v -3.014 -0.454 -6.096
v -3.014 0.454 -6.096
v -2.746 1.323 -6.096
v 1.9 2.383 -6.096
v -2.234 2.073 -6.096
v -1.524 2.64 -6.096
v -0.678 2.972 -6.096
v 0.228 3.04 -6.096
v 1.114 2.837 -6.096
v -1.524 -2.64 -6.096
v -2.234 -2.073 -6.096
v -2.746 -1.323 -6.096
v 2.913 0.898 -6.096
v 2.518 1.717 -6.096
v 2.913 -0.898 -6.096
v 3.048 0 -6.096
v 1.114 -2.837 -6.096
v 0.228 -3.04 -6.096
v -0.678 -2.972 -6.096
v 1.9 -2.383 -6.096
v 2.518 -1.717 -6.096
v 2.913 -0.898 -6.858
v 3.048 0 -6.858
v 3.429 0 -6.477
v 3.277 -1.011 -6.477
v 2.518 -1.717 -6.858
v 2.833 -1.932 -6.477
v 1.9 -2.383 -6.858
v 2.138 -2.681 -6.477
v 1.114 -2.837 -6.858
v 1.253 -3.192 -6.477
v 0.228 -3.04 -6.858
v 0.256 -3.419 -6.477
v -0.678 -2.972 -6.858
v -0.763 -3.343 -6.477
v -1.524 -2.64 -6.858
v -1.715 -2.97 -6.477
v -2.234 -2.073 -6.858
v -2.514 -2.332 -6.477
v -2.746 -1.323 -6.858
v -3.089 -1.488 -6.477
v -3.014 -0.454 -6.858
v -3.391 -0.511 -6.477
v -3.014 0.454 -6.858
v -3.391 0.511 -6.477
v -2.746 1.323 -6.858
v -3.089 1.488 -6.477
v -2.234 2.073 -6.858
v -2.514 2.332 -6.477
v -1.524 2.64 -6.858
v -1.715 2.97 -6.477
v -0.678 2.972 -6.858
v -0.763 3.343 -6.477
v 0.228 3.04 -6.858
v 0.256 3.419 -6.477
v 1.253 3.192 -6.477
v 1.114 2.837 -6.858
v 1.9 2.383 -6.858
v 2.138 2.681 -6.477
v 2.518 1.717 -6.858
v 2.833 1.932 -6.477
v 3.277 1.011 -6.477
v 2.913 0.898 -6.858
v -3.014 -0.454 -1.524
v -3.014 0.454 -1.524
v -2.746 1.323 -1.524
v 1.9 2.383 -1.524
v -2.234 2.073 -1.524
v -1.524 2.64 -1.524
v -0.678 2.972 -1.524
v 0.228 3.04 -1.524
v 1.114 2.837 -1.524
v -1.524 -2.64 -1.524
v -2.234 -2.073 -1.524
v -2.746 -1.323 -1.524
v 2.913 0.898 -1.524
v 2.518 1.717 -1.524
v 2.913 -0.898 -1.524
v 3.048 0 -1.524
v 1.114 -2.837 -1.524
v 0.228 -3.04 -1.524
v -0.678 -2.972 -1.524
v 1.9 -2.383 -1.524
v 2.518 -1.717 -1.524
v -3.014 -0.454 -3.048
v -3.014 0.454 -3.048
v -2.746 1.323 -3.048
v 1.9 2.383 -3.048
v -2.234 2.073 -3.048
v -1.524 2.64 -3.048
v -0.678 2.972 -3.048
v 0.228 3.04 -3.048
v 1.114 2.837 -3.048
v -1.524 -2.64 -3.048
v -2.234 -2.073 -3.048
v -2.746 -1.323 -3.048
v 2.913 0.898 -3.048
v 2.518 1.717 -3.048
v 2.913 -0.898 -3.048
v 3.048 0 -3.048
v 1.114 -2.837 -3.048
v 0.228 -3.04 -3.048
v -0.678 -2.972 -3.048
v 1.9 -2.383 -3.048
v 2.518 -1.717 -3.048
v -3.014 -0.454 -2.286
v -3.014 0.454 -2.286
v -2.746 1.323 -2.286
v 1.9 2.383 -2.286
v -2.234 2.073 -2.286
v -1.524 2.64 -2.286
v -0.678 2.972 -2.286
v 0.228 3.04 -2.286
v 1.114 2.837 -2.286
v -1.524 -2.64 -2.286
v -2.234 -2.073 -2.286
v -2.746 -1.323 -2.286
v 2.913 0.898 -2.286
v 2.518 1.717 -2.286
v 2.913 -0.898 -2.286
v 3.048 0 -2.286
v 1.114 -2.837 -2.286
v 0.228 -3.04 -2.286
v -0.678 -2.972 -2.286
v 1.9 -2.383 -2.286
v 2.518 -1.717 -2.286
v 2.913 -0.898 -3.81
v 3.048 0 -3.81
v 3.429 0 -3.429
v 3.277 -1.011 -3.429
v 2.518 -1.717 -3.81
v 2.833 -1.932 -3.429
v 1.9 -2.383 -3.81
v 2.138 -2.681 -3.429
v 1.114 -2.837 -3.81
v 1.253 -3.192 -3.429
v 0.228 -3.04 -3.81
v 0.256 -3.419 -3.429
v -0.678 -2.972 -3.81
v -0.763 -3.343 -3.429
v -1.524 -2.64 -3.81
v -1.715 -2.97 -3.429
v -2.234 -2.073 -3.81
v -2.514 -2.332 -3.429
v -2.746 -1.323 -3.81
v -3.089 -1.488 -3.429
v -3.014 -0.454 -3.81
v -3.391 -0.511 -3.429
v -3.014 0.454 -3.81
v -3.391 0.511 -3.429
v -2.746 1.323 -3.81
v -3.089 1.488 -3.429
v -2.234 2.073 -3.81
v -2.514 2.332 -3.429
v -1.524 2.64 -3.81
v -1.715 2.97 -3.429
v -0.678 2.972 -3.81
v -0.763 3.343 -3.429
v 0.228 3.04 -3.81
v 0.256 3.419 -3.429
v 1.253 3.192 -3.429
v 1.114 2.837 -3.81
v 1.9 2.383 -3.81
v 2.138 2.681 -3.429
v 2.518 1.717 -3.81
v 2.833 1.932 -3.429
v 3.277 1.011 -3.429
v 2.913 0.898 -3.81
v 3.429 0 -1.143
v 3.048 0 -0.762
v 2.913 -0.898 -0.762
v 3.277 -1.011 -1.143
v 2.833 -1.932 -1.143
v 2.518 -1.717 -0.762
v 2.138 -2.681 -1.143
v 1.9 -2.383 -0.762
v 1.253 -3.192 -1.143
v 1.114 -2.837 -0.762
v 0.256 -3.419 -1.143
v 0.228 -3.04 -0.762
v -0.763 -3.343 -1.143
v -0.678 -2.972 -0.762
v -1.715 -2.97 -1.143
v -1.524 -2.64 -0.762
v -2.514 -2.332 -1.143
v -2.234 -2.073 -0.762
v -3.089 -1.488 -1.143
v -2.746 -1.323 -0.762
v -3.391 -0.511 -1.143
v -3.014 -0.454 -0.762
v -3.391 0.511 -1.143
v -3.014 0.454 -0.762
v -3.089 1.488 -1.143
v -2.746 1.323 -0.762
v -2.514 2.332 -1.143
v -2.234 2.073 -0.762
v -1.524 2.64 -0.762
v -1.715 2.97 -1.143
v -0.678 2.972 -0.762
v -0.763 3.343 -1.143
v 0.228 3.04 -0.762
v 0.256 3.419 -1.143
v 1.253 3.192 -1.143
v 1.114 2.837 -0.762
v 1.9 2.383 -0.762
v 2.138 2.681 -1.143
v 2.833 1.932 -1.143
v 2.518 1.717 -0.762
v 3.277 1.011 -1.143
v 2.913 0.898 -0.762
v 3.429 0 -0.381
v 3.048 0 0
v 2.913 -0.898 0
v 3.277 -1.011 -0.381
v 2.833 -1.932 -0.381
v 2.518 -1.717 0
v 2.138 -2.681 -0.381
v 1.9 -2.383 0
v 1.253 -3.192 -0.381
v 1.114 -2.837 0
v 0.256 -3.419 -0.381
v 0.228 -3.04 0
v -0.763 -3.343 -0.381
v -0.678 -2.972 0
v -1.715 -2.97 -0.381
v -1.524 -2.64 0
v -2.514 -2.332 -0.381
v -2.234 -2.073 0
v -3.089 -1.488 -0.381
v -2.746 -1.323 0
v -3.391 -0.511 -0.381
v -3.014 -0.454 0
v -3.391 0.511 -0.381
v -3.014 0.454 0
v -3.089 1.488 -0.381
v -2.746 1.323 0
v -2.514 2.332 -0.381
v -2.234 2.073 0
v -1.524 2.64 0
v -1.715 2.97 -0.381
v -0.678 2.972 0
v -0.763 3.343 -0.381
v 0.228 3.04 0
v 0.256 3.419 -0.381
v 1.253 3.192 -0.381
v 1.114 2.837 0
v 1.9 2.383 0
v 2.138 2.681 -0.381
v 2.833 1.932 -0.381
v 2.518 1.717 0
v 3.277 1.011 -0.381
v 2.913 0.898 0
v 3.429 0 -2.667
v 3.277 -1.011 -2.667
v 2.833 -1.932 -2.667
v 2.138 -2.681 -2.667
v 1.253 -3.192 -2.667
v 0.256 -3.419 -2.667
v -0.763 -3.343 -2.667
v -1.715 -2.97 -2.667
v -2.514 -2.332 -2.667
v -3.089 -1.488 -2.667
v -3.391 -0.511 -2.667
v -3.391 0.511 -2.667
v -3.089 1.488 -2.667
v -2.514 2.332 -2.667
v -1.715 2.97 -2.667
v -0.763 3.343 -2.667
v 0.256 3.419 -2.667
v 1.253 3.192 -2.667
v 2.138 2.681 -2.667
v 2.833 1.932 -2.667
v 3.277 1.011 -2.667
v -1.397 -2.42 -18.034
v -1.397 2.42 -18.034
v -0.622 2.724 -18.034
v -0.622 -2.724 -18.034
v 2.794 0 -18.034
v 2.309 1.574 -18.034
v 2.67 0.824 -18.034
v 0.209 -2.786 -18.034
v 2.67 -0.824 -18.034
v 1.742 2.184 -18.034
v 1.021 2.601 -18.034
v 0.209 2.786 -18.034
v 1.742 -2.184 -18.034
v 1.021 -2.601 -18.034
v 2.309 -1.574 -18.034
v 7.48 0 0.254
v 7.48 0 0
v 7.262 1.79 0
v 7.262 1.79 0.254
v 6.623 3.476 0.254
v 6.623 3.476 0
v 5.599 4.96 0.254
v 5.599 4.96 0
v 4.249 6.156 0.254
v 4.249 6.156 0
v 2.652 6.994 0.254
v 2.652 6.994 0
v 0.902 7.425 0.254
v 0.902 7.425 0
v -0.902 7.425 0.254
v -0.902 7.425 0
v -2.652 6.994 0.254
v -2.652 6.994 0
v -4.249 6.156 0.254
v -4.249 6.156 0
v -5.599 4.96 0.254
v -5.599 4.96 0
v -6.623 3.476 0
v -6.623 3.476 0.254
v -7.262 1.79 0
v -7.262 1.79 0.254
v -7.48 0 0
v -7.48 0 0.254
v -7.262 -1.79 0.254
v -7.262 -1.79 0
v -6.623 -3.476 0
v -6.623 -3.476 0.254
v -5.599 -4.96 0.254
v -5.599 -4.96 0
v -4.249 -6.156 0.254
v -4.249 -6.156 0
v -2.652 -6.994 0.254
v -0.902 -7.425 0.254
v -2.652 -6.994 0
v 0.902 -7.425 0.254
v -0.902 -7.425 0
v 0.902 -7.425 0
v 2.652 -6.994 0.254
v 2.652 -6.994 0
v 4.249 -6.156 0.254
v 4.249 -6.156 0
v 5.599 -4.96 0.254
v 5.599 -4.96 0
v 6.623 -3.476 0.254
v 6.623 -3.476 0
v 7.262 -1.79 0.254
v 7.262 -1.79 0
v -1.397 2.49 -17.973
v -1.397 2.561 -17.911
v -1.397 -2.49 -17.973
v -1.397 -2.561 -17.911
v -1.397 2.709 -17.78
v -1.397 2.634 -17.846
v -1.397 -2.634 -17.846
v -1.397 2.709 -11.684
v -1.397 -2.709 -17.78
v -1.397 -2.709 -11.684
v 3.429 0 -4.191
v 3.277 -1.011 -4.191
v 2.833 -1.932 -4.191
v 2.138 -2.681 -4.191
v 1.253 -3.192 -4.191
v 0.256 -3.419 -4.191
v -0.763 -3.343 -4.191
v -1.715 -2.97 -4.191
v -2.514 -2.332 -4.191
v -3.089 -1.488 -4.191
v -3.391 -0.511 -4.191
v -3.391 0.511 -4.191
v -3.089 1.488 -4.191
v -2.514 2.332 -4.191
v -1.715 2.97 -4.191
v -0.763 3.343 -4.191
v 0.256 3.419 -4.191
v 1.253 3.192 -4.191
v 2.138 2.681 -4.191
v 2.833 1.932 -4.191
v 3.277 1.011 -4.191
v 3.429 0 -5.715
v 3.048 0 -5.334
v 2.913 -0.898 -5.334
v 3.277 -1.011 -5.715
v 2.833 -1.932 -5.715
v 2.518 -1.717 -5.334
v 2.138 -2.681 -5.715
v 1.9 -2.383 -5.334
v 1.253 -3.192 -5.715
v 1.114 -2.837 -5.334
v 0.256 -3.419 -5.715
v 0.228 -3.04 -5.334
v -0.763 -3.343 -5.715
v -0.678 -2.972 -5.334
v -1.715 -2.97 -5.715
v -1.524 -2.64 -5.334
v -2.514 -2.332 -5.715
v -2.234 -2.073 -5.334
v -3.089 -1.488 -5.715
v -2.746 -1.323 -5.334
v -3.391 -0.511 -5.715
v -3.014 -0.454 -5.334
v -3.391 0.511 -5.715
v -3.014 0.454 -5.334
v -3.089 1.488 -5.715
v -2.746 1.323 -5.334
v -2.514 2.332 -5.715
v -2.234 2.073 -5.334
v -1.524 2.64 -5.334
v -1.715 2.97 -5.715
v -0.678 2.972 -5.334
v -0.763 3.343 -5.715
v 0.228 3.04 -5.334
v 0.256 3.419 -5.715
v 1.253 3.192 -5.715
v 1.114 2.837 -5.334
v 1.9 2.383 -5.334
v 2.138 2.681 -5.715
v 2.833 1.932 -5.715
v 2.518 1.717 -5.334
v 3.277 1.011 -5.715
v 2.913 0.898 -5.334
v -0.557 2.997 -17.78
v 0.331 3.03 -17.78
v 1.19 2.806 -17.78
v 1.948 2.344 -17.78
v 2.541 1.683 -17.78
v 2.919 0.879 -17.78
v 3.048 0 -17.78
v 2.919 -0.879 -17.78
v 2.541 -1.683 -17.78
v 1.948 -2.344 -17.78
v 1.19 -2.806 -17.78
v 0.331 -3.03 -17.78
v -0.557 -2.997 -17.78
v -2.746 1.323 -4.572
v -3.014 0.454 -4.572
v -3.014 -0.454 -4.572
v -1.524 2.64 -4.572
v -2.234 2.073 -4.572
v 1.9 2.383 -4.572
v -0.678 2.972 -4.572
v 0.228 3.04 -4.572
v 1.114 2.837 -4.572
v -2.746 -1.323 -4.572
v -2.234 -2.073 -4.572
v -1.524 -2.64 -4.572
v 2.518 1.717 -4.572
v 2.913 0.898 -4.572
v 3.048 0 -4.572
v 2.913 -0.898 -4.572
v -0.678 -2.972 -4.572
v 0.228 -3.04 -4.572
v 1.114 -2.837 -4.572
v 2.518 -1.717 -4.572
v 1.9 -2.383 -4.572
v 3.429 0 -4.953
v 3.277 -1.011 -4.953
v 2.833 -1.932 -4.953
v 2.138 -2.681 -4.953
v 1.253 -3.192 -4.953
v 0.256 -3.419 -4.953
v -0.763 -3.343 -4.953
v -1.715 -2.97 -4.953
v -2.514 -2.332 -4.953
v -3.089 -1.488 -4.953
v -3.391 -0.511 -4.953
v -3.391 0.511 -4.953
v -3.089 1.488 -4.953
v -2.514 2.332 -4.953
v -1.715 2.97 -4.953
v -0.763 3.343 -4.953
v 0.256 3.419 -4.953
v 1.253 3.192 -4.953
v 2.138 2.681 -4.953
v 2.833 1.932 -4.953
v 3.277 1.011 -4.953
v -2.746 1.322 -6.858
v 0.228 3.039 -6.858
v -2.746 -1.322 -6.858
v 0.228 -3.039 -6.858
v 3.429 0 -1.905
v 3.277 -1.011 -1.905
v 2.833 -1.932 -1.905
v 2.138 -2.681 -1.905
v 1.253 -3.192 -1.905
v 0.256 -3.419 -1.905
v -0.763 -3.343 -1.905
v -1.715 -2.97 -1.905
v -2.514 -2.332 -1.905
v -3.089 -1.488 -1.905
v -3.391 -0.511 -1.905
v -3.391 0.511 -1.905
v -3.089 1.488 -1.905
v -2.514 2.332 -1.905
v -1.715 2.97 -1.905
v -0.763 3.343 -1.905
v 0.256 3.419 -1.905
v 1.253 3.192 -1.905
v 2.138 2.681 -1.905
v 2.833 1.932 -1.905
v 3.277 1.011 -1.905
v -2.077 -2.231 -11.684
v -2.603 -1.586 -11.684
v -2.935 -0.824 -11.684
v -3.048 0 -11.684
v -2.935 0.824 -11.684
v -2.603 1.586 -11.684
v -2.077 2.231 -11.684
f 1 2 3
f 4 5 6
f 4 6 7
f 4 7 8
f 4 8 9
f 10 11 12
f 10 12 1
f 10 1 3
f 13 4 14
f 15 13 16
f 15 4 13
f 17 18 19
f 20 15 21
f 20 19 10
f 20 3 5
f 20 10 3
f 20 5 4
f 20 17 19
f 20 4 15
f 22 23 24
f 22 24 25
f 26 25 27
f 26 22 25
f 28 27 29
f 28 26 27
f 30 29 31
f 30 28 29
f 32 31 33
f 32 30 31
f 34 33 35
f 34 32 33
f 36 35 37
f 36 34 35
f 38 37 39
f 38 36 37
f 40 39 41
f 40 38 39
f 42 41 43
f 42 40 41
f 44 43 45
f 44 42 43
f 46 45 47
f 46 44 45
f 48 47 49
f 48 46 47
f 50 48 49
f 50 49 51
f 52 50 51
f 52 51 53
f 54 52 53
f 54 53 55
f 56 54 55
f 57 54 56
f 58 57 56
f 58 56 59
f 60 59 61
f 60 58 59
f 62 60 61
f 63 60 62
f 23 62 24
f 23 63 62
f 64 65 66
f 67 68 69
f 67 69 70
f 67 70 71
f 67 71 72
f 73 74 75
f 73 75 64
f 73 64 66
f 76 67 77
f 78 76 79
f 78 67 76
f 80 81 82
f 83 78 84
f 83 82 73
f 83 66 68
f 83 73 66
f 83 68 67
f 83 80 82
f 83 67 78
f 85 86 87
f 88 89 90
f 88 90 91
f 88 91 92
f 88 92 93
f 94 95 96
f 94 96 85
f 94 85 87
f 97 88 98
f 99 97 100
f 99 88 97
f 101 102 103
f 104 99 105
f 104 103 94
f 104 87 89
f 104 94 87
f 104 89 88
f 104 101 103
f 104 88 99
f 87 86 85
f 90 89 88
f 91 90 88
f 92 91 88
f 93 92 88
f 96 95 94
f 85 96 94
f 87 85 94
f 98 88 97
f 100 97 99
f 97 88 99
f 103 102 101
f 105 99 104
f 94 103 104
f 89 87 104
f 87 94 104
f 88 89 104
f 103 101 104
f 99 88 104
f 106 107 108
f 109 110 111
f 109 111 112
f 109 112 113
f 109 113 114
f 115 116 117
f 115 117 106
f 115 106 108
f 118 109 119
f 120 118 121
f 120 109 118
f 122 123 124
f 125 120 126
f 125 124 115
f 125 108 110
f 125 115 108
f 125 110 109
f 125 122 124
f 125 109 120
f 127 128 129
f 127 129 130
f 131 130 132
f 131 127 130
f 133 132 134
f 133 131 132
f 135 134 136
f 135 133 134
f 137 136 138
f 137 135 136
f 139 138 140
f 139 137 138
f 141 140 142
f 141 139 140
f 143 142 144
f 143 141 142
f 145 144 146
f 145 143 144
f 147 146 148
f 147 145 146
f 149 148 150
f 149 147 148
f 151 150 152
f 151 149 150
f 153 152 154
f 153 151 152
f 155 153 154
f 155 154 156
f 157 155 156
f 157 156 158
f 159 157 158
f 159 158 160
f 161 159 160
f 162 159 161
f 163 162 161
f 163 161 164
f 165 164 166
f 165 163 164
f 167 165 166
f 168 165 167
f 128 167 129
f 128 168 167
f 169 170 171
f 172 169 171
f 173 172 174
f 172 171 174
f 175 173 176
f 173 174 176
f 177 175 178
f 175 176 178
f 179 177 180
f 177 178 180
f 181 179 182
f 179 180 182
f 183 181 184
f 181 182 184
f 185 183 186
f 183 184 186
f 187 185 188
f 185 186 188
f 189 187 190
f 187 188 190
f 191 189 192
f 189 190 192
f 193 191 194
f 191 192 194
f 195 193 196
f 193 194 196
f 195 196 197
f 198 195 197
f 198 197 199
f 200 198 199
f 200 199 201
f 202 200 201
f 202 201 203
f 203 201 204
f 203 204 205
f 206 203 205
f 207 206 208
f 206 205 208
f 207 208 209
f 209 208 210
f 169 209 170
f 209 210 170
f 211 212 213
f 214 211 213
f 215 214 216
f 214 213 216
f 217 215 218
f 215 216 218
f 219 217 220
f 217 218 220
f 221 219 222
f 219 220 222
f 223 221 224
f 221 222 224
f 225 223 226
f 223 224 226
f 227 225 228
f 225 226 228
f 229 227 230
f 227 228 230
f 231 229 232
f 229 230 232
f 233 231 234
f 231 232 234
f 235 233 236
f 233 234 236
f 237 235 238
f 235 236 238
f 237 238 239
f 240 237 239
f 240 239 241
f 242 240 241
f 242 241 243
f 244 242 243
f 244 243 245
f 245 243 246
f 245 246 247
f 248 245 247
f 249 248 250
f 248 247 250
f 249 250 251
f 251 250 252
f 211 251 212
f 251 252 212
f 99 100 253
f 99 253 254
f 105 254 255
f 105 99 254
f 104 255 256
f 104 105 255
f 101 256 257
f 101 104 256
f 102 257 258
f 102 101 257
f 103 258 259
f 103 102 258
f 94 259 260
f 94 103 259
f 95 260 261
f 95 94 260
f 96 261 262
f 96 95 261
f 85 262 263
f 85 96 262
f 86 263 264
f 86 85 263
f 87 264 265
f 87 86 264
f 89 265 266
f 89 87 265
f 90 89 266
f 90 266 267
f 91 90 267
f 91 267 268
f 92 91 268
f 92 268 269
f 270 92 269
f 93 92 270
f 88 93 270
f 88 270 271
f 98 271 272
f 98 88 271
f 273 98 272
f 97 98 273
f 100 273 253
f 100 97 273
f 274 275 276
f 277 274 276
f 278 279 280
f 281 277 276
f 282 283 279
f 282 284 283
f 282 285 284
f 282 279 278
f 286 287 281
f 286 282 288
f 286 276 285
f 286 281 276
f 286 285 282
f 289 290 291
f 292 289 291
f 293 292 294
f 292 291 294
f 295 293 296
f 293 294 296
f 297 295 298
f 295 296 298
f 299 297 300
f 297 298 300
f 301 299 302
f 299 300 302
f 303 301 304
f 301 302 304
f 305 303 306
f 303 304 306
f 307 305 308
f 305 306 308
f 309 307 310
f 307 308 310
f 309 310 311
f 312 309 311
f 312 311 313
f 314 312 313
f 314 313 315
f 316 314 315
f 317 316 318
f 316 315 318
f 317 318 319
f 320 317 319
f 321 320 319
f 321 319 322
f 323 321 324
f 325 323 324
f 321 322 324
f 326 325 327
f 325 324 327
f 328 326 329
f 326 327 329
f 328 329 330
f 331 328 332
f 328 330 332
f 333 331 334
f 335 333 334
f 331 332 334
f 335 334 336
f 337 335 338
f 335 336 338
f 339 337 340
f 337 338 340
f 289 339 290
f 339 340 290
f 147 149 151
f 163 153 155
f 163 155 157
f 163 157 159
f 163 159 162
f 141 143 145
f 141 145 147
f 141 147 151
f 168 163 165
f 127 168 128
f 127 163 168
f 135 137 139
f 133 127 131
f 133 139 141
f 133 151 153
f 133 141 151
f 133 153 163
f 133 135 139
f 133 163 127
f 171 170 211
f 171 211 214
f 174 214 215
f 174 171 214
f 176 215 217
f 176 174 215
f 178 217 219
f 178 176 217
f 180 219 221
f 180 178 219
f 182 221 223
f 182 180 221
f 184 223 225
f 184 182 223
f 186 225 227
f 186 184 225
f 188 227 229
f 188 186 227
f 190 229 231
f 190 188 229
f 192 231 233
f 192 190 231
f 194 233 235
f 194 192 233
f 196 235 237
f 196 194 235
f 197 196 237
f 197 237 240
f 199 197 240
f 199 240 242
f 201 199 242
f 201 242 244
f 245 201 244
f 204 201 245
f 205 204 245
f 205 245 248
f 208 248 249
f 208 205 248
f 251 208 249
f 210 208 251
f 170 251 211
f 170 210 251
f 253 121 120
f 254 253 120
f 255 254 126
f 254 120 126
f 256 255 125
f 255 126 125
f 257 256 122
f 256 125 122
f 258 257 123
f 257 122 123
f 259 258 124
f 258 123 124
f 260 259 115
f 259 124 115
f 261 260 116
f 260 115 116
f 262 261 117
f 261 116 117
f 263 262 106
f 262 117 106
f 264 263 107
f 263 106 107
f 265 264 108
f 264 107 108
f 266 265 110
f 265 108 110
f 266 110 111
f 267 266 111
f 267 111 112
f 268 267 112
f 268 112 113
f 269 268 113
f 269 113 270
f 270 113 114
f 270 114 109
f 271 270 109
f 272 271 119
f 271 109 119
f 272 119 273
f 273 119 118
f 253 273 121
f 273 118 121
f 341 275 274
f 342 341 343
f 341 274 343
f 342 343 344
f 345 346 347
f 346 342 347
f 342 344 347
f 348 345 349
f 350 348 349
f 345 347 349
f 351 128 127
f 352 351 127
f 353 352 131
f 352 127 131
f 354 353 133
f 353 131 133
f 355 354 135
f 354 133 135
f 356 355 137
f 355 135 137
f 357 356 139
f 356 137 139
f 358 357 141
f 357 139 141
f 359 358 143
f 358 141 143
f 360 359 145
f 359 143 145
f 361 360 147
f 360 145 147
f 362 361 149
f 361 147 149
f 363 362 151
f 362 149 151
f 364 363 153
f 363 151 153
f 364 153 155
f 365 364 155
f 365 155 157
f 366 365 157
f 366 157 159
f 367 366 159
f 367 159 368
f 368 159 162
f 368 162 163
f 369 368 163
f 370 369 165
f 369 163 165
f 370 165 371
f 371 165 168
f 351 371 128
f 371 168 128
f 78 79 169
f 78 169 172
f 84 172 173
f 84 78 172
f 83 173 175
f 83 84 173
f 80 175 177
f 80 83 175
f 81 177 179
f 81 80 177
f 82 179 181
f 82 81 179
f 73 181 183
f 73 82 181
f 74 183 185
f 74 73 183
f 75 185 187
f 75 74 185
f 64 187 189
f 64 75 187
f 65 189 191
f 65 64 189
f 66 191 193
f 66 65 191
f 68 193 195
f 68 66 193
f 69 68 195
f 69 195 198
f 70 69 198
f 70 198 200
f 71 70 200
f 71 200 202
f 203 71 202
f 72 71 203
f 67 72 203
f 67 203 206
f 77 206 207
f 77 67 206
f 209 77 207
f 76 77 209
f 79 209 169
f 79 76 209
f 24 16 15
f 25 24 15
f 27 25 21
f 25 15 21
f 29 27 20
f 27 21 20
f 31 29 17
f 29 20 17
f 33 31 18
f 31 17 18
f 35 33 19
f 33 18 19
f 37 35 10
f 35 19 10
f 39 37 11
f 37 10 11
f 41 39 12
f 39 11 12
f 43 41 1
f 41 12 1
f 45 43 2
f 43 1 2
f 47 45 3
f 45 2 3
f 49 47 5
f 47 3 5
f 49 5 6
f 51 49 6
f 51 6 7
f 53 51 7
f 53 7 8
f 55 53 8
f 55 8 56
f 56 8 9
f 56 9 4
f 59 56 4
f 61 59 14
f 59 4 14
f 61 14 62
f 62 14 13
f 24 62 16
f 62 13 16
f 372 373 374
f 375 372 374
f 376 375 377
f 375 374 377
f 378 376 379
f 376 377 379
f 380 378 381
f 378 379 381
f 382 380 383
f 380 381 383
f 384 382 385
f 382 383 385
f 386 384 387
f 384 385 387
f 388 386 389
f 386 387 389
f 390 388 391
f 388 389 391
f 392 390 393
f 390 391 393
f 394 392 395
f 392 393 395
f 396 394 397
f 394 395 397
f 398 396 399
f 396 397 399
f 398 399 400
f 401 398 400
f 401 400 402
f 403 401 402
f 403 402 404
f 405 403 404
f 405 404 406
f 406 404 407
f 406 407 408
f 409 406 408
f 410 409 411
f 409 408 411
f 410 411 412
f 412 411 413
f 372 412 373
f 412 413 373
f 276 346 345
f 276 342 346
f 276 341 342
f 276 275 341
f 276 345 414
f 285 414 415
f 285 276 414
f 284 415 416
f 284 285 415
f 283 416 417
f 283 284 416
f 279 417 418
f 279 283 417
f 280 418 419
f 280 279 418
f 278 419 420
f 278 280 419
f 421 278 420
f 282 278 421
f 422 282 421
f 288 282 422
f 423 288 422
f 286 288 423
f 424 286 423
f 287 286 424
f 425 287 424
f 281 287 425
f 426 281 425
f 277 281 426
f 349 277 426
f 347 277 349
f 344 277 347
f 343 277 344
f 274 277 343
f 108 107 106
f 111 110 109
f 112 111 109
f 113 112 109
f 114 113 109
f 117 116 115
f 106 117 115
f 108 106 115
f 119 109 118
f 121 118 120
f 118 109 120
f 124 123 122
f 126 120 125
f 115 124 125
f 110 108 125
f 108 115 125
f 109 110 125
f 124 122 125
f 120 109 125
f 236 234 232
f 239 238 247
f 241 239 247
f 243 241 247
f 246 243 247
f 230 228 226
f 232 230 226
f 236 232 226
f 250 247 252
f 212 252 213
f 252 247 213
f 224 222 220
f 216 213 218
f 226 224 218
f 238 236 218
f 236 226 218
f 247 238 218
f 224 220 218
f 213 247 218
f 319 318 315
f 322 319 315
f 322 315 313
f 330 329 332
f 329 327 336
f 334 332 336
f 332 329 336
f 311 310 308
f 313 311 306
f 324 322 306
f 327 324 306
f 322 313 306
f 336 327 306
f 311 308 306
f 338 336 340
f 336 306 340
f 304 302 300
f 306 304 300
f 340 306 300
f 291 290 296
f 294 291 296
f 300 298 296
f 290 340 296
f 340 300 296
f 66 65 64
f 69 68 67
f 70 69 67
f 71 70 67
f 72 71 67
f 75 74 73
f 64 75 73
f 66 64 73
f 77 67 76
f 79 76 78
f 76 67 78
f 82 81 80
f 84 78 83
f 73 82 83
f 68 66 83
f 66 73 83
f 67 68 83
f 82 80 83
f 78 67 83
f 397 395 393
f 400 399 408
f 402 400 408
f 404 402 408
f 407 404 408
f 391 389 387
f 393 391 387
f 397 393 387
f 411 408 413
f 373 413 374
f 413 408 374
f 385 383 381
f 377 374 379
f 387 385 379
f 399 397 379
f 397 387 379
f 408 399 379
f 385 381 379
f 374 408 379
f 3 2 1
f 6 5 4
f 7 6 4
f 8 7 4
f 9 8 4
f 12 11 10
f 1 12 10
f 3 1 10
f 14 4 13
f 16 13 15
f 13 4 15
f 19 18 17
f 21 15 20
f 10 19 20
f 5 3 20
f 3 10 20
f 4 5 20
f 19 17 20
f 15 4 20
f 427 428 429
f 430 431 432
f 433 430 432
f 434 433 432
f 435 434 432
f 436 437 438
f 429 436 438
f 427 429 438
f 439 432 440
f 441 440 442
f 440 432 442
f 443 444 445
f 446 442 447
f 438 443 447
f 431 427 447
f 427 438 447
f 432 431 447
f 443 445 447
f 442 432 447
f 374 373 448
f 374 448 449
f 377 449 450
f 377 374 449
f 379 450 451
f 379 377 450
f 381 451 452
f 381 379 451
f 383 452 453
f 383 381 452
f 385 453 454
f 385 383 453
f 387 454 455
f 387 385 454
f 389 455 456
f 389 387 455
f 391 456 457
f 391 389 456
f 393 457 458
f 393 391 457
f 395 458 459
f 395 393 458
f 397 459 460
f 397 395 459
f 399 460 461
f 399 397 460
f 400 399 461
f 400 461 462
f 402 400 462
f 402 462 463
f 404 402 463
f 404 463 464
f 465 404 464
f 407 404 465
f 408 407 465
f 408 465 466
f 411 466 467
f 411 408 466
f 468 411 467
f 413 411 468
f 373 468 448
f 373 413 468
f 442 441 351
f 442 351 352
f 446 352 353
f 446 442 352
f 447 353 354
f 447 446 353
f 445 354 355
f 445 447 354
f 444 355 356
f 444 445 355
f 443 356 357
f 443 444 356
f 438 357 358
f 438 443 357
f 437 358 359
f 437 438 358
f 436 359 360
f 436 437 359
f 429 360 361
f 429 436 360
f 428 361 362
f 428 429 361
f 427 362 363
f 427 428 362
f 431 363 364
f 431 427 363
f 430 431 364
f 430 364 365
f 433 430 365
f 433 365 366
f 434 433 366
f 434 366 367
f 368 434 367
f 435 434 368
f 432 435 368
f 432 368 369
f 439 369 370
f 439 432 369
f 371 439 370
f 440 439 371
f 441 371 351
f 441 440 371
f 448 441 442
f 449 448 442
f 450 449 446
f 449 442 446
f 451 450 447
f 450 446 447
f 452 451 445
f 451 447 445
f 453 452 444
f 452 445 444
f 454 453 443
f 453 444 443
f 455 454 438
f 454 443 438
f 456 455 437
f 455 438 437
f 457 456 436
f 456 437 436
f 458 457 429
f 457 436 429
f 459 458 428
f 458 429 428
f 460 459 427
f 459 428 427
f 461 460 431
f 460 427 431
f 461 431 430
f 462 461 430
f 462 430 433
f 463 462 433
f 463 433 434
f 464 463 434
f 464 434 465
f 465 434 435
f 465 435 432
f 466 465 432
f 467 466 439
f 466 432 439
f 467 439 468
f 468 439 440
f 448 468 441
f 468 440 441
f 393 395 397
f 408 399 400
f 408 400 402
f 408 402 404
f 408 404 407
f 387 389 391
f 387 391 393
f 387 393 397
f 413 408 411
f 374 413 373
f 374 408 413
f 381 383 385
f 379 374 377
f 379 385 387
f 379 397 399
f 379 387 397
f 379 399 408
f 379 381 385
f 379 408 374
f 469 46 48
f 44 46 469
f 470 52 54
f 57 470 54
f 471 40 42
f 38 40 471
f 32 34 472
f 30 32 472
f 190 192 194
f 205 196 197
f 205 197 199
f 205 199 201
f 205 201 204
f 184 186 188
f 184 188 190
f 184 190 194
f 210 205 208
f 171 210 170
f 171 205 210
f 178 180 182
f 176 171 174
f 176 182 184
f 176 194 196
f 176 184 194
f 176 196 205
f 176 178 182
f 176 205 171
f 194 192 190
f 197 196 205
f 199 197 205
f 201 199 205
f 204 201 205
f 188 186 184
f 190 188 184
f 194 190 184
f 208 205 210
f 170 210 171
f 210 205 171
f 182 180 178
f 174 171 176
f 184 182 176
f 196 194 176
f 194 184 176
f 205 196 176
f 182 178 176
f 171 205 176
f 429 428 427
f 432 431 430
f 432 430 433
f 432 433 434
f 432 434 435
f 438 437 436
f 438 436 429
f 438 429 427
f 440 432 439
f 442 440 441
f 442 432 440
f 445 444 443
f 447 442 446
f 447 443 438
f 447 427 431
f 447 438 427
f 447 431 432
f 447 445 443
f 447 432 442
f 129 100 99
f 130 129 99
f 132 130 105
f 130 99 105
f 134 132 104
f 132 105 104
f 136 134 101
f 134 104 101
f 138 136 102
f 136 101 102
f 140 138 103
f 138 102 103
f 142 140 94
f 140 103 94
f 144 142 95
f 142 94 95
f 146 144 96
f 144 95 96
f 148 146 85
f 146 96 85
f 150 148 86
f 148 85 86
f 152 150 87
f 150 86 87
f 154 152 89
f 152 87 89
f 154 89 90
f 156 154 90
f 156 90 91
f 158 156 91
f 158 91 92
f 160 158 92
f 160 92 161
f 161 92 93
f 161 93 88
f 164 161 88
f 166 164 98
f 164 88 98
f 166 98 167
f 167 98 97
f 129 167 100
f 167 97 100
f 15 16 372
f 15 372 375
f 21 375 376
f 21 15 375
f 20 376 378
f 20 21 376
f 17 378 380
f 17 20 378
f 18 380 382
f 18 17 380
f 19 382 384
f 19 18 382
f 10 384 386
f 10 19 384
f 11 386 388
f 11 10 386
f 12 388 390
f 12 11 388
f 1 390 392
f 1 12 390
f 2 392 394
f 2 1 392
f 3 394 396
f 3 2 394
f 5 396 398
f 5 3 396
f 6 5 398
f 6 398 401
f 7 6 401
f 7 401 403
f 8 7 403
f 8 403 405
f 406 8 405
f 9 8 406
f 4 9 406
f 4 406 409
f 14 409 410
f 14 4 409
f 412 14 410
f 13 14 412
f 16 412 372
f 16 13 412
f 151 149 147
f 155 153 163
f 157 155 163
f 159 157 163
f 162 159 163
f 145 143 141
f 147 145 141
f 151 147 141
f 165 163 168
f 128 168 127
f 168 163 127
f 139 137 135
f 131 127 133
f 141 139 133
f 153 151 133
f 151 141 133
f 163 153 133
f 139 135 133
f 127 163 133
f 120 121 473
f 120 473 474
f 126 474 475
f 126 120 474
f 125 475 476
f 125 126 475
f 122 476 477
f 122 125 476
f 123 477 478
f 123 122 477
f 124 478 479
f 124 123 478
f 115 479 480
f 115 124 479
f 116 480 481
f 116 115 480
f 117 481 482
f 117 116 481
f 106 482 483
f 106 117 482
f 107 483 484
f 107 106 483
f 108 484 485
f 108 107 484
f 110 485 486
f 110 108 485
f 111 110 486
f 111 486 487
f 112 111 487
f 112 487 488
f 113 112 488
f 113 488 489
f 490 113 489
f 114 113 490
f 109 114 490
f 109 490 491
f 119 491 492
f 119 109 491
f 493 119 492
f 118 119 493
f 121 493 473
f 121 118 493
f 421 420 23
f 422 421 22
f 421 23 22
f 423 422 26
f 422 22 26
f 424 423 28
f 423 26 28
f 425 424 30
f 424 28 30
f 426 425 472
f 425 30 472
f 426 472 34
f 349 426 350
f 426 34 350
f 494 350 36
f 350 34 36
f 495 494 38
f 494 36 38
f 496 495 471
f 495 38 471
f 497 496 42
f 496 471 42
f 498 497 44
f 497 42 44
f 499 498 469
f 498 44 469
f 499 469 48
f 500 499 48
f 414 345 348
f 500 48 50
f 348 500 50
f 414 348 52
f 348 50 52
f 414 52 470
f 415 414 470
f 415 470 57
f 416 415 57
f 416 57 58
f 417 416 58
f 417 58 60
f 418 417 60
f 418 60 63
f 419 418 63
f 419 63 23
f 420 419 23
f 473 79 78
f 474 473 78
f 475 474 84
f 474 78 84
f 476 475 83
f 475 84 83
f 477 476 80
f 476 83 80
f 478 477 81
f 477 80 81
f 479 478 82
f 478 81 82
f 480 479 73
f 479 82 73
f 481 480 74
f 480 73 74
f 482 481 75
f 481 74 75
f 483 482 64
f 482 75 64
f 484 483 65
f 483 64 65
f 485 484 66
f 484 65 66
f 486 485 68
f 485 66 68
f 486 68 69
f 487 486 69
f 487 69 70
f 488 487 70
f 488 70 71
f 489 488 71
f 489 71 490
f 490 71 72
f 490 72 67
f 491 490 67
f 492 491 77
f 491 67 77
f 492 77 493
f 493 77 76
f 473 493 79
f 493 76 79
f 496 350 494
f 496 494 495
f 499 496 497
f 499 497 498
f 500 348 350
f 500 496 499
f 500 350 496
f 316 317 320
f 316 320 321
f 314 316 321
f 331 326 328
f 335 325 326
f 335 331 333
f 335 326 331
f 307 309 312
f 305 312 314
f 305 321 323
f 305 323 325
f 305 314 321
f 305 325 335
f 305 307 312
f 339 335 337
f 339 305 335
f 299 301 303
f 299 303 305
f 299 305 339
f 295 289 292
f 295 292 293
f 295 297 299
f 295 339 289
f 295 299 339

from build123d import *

# Parameters (mm, degrees)
SKETCH1_R           = 7.479732897
BOSS_EXTRUDE1_DEPTH = 0.254
SKETCH2_R           = 3.429
BOSS_EXTRUDE2_DEPTH = 0.762
CHAMFER1_SIZE       = 0.381
LPATTERN3_COUNT     = 9
LPATTERN3_PITCH     = 0.762
SKETCH3_R           = 3.048
BOSS_EXTRUDE3_DEPTH = 11.176
CUT_EXTRUDE1_DEPTH  = 6.35
CHAMFER2_SIZE       = 0.254


with BuildPart() as part:
    # Sketch1 → Boss-Extrude1 (new body)
    with BuildSketch(Plane.XY):
        Circle(SKETCH1_R)
    extrude(amount=BOSS_EXTRUDE1_DEPTH)


with BuildPart() as body_2:
    # Sketch2 → Boss-Extrude2 (new body)
    with BuildSketch(Plane(origin=(0, 0, 0), x_dir=(-1, 0, 0), z_dir=(0, 0, -1))):
        with Locations(Location((0, 0, 0), (0, 0, 180))):
            Circle(SKETCH2_R)
    extrude(amount=BOSS_EXTRUDE2_DEPTH)

    # Chamfer1
    chamfer1_edges = [body_2.edges().sort_by_distance(p)[0] for p in [
        (-3.429, 0, 0),
        (-3.429, 0, -0.762),
    ]]
    chamfer(chamfer1_edges, length=CHAMFER1_SIZE - 0.0001)  # a hair under: the kernel refuses the full size


with BuildPart() as lpattern3_1:
    # LPattern3: pattern copy
    add(body_2.part.moved(Location(Vector(0, 0, -1) * (1 * LPATTERN3_PITCH))))


with BuildPart() as lpattern3_2:
    # LPattern3: pattern copy
    add(body_2.part.moved(Location(Vector(0, 0, -1) * (2 * LPATTERN3_PITCH))))


with BuildPart() as lpattern3_3:
    # LPattern3: pattern copy
    add(body_2.part.moved(Location(Vector(0, 0, -1) * (3 * LPATTERN3_PITCH))))


with BuildPart() as lpattern3_4:
    # LPattern3: pattern copy
    add(body_2.part.moved(Location(Vector(0, 0, -1) * (4 * LPATTERN3_PITCH))))


with BuildPart() as lpattern3_5:
    # LPattern3: pattern copy
    add(body_2.part.moved(Location(Vector(0, 0, -1) * (5 * LPATTERN3_PITCH))))


with BuildPart() as lpattern3_6:
    # LPattern3: pattern copy
    add(body_2.part.moved(Location(Vector(0, 0, -1) * (6 * LPATTERN3_PITCH))))


with BuildPart() as lpattern3_7:
    # LPattern3: pattern copy
    add(body_2.part.moved(Location(Vector(0, 0, -1) * (7 * LPATTERN3_PITCH))))


with BuildPart() as lpattern3_8:
    # LPattern3: pattern copy
    add(body_2.part.moved(Location(Vector(0, 0, -1) * (8 * LPATTERN3_PITCH))))

    # Sketch3 → Boss-Extrude3 (add)
    with BuildSketch(Plane(origin=(0, 0, -6.858), x_dir=(-1, 0, 0), z_dir=(0, 0, -1))):
        with Locations(Location((0, 0, 0), (0, 0, 180))):
            Circle(SKETCH3_R)
    extrude(amount=BOSS_EXTRUDE3_DEPTH)

    # Sketch4 → Cut-Extrude1 (cut)
    with BuildSketch(Plane(origin=(0, 0, -18.034), x_dir=(-1, 0, 0), z_dir=(0, 0, -1))):
        with BuildLine():
            Line((1.397, 2.709002584), (1.397, -2.709002584))
            ThreePointArc((1.397, -2.709002584), (3.048, 0), (1.397, 2.709002584))
        make_face()
    extrude(amount=-CUT_EXTRUDE1_DEPTH, mode=Mode.SUBTRACT)

    # Chamfer2
    chamfer2_edges = [lpattern3_8.edges().sort_by_distance(p)[0] for p in [
        (1.586229492, -2.602725495, -18.034),
    ]]
    chamfer(chamfer2_edges, length=CHAMFER2_SIZE)


solid = Compound([part.part, body_2.part, lpattern3_1.part, lpattern3_2.part, lpattern3_3.part, lpattern3_4.part, lpattern3_5.part, lpattern3_6.part, lpattern3_7.part, lpattern3_8.part])
